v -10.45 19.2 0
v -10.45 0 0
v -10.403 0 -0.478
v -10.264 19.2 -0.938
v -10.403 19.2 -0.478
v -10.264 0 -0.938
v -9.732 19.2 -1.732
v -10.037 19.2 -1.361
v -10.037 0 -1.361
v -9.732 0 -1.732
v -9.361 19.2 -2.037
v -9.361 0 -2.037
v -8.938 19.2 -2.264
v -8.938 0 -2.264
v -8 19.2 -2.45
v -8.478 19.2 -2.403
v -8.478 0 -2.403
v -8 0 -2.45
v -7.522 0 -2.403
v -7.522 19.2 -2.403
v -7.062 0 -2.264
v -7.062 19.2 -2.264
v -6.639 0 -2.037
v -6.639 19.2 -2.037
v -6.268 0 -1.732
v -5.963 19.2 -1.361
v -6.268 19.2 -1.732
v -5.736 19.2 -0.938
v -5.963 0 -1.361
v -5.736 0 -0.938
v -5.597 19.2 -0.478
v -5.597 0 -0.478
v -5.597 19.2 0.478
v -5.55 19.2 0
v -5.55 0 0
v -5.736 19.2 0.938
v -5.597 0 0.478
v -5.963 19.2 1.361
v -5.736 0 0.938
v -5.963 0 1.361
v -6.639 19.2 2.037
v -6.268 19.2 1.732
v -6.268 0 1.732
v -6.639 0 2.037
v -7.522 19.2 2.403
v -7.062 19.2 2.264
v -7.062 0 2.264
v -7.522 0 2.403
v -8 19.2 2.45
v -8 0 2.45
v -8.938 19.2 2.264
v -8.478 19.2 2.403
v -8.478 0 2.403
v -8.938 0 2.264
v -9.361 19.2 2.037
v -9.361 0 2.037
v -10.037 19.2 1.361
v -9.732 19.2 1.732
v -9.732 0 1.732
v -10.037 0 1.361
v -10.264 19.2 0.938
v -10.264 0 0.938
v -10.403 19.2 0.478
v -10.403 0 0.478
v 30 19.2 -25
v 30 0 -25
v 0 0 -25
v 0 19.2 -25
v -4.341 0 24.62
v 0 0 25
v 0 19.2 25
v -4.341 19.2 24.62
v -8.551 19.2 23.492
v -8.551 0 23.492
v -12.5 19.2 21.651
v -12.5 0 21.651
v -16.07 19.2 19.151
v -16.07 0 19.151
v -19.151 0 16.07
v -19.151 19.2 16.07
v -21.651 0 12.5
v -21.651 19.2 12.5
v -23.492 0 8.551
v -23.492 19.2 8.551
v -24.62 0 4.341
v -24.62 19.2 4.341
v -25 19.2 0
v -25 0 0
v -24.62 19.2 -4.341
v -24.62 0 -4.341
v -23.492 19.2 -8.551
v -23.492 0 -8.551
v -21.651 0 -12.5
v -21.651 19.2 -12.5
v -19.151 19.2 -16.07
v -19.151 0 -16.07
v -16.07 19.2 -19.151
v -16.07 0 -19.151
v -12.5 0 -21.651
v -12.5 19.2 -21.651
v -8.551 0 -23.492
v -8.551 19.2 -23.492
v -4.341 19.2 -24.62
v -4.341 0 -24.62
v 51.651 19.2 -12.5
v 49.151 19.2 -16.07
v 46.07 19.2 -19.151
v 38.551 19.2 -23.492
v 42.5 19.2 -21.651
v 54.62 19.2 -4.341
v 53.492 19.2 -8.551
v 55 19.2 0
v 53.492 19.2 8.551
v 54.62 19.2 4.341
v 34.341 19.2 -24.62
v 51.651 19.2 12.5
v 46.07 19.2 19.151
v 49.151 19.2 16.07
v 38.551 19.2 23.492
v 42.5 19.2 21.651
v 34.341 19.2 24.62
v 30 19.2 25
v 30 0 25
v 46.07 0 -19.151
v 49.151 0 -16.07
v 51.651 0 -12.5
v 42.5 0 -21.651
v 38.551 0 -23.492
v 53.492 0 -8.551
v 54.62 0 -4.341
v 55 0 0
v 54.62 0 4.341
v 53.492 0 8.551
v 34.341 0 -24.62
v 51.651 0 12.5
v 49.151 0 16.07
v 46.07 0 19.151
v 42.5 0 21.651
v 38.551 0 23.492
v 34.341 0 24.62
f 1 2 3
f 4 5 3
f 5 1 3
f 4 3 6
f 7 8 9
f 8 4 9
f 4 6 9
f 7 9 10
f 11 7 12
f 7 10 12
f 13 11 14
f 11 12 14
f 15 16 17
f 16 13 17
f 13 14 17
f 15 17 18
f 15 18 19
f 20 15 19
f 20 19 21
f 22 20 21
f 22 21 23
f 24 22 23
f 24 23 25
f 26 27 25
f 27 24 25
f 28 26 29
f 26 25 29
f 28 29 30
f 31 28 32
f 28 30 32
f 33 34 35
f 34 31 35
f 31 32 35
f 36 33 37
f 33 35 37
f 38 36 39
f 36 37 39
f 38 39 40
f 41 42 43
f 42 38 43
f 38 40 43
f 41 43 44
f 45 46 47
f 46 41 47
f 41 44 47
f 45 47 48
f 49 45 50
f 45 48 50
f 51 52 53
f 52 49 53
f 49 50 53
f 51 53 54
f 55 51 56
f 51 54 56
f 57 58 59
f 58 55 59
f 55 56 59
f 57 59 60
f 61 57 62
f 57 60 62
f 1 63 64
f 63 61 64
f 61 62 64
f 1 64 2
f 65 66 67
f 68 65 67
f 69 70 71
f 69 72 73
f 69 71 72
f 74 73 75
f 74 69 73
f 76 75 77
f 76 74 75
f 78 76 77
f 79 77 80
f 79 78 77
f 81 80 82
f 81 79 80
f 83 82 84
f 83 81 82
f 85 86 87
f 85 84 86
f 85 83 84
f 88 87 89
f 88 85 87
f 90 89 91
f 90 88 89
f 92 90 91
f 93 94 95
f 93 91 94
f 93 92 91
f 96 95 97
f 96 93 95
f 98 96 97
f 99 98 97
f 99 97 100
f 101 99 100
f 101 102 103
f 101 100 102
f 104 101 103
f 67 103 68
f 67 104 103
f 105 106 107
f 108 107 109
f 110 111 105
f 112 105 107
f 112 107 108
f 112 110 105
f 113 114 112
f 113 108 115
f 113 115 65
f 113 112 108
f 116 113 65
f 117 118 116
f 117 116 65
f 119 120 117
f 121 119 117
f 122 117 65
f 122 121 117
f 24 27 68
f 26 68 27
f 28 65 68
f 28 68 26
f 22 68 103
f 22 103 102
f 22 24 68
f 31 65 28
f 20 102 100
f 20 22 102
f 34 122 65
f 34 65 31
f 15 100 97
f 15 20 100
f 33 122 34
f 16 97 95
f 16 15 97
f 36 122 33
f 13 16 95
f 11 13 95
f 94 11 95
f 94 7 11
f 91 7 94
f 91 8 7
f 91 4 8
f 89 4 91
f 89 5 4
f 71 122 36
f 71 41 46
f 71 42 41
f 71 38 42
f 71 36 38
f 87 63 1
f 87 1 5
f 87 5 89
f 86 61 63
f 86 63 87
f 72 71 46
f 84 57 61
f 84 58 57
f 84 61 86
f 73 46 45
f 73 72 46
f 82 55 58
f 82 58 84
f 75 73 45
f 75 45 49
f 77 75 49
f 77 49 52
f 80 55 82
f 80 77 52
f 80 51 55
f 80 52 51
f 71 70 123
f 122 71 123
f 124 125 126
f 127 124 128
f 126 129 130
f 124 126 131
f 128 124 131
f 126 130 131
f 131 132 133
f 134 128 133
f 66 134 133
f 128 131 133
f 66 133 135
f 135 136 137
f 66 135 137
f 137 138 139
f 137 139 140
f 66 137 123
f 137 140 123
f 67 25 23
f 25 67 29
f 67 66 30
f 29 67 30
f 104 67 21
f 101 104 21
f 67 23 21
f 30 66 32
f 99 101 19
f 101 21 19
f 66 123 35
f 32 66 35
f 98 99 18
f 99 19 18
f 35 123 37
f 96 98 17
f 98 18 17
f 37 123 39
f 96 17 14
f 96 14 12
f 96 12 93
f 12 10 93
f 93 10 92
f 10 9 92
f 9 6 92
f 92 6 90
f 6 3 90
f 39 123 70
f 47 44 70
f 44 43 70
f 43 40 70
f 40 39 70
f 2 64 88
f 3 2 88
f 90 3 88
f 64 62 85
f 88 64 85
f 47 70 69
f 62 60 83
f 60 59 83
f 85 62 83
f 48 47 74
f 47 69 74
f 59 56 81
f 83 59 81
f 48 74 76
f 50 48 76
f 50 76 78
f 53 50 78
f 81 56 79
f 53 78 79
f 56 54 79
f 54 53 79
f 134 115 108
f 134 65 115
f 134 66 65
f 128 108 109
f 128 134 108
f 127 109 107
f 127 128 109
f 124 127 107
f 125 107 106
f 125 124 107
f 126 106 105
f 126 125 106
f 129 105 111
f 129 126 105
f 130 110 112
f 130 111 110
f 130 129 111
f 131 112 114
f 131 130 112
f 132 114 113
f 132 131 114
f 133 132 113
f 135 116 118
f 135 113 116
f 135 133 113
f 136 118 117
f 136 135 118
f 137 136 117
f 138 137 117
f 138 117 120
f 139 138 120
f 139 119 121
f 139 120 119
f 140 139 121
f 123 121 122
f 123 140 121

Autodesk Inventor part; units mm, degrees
ref_plane "YZ Plane" through (0, 0, 0) normal (1, 0, 0) x (0, 1, 0)
ref_plane "XZ Plane" through (0, 0, 0) normal (0, 1, 0) x (-1, 0, 0)
ref_plane "XY Plane" through (0, 0, 0) normal (0, 0, 1) x (1, 0, 0)
sketch "Sketch1" plane through (0, 0, 0) normal (0, 1, 0) x (-1, 0, 0)
  line L0 (0, 0) -> (-30, 0) construction
  line L1 (0, 25) -> (-30, 25)
  line L2 (-30, -25) -> (0, -25)
  arc A0 (0, -25) -> (0, 25) centre (0, 0) ccw
  arc A1 (-30, 25) -> (-30, -25) centre (-30, 0) ccw
  circle A2 centre (8, 0) radius 2.45
  line L3 (0, 0) -> (25, 0) construction
  circle A3 centre (8, 0) radius 22.5 construction
  circle A4 centre (8, 0) radius 15 construction
  point P0 (-15, 0)
  dimension "d26" = 50
  dimension "d27" = 30
  dimension "d28" = 4.9
  dimension "d29" = 8
  dimension "d30" = 17
  dimension "d31" = 45
  dimension "d32" = 30
extrude "Extrusion6" add sketch "Sketch1" along normal blind 19.2
equation "\"d23\" = printing_w"
equation "\"blade_w\" = 0.3"
equation "\"calib_w\" = 0.3"
equation "\"print_fit_w\" = 0.2"
equation "\"printing_w\" = -calib_w + nominal_w - blade_w - print_fit_w"
equation "\"nominal_w\" = 20"
properties part number "071_0202_RollCutter20mmCenter"
